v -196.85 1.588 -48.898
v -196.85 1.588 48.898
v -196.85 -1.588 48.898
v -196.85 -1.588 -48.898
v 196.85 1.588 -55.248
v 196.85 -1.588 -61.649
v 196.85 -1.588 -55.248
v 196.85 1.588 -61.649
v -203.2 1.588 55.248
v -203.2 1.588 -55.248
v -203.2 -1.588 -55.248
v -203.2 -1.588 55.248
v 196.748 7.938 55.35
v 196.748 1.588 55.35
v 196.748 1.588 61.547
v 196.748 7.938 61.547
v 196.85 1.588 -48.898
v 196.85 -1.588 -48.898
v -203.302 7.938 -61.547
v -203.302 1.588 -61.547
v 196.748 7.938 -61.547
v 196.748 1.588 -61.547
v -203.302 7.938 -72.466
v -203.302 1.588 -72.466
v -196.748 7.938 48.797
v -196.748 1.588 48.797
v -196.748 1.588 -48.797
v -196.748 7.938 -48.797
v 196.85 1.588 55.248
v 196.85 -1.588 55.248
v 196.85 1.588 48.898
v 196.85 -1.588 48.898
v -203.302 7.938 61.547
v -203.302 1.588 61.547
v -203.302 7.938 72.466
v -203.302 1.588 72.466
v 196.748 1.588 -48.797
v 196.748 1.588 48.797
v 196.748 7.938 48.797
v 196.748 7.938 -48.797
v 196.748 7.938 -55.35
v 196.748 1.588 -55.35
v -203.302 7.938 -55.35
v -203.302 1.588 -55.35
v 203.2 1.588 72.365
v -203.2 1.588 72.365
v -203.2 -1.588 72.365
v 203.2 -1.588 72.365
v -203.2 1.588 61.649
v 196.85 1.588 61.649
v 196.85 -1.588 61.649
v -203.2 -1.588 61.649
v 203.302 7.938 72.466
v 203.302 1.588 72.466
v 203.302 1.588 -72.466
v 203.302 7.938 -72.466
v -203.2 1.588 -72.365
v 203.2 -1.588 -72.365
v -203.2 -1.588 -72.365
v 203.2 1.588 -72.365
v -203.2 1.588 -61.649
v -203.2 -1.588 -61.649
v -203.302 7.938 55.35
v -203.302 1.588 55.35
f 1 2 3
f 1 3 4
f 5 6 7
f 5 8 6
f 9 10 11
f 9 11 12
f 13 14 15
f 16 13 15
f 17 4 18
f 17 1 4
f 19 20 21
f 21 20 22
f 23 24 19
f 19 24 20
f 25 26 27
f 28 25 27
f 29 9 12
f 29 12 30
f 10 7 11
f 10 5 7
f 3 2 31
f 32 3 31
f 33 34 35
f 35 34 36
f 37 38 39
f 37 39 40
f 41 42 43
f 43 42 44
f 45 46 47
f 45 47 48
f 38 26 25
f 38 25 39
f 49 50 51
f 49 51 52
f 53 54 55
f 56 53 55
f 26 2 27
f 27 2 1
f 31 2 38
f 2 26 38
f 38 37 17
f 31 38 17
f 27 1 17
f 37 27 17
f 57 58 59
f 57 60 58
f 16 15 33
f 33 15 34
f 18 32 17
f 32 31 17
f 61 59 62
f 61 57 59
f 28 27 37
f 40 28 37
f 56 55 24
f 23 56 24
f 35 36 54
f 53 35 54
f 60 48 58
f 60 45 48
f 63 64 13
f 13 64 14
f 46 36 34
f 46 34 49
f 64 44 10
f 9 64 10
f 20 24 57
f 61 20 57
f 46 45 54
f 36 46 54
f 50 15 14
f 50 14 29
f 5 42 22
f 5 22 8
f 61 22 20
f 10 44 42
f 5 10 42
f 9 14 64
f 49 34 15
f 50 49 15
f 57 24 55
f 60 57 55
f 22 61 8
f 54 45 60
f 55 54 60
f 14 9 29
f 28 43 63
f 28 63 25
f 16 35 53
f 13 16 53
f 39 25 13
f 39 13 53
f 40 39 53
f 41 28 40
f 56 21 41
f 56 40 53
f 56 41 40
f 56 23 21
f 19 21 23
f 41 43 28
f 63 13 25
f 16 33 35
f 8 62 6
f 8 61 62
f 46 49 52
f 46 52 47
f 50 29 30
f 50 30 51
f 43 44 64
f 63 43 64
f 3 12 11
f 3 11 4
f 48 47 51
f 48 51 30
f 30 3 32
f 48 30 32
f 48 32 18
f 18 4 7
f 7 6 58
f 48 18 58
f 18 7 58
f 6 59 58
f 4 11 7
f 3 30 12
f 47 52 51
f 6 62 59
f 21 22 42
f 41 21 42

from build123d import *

# Parameters (mm, degrees)
SKETCH1_W           = 393.7
SKETCH1_H           = 97.79635
BOSS_EXTRUDE1_DEPTH = 1.5875
SKETCH4_W           = 393.4968
SKETCH4_H           = 97.59315
BOSS_EXTRUDE4_DEPTH = 6.35


with BuildPart() as part:
    # Sketch1 → Boss-Extrude1 (new body, symmetric)
    with BuildSketch(Plane(origin=(0, 0, 0), x_dir=(1, 0, 0), z_dir=(0, 1, 0))):
        Polygon((196.85, 55.248175), (-203.2, 55.248175), (-203.2, -55.248175), (196.85, -55.248175), (196.85, -61.648975), (-203.2, -61.648975), (-203.2, -72.3646), (190.5, -72.3646), (203.2, -72.3646), (203.2, 72.3646), (190.5, 72.3646), (-203.2, 72.3646), (-203.2, 61.648975), (196.85, 61.648975), align=None)
        Rectangle(SKETCH1_W, SKETCH1_H, mode=Mode.SUBTRACT)
    extrude(amount=BOSS_EXTRUDE1_DEPTH, both=True)

    # Sketch4 → Boss-Extrude4 (add)
    with BuildSketch(Plane(origin=(0, 1.5875, 0), x_dir=(1, 0, 0), z_dir=(0, 1, 0))):
        Polygon((-203.3016, 61.547375), (196.7484, 61.547375), (196.7484, 55.349775), (-203.3016, 55.349775), (-203.3016, -55.349775), (196.7484, -55.349775), (196.7484, -61.547375), (-203.3016, -61.547375), (-203.3016, -72.4662), (203.3016, -72.4662), (203.3016, 72.4662), (-203.3016, 72.4662), align=None)
        Rectangle(SKETCH4_W, SKETCH4_H, mode=Mode.SUBTRACT)
    extrude(amount=BOSS_EXTRUDE4_DEPTH)


solid = part.part
